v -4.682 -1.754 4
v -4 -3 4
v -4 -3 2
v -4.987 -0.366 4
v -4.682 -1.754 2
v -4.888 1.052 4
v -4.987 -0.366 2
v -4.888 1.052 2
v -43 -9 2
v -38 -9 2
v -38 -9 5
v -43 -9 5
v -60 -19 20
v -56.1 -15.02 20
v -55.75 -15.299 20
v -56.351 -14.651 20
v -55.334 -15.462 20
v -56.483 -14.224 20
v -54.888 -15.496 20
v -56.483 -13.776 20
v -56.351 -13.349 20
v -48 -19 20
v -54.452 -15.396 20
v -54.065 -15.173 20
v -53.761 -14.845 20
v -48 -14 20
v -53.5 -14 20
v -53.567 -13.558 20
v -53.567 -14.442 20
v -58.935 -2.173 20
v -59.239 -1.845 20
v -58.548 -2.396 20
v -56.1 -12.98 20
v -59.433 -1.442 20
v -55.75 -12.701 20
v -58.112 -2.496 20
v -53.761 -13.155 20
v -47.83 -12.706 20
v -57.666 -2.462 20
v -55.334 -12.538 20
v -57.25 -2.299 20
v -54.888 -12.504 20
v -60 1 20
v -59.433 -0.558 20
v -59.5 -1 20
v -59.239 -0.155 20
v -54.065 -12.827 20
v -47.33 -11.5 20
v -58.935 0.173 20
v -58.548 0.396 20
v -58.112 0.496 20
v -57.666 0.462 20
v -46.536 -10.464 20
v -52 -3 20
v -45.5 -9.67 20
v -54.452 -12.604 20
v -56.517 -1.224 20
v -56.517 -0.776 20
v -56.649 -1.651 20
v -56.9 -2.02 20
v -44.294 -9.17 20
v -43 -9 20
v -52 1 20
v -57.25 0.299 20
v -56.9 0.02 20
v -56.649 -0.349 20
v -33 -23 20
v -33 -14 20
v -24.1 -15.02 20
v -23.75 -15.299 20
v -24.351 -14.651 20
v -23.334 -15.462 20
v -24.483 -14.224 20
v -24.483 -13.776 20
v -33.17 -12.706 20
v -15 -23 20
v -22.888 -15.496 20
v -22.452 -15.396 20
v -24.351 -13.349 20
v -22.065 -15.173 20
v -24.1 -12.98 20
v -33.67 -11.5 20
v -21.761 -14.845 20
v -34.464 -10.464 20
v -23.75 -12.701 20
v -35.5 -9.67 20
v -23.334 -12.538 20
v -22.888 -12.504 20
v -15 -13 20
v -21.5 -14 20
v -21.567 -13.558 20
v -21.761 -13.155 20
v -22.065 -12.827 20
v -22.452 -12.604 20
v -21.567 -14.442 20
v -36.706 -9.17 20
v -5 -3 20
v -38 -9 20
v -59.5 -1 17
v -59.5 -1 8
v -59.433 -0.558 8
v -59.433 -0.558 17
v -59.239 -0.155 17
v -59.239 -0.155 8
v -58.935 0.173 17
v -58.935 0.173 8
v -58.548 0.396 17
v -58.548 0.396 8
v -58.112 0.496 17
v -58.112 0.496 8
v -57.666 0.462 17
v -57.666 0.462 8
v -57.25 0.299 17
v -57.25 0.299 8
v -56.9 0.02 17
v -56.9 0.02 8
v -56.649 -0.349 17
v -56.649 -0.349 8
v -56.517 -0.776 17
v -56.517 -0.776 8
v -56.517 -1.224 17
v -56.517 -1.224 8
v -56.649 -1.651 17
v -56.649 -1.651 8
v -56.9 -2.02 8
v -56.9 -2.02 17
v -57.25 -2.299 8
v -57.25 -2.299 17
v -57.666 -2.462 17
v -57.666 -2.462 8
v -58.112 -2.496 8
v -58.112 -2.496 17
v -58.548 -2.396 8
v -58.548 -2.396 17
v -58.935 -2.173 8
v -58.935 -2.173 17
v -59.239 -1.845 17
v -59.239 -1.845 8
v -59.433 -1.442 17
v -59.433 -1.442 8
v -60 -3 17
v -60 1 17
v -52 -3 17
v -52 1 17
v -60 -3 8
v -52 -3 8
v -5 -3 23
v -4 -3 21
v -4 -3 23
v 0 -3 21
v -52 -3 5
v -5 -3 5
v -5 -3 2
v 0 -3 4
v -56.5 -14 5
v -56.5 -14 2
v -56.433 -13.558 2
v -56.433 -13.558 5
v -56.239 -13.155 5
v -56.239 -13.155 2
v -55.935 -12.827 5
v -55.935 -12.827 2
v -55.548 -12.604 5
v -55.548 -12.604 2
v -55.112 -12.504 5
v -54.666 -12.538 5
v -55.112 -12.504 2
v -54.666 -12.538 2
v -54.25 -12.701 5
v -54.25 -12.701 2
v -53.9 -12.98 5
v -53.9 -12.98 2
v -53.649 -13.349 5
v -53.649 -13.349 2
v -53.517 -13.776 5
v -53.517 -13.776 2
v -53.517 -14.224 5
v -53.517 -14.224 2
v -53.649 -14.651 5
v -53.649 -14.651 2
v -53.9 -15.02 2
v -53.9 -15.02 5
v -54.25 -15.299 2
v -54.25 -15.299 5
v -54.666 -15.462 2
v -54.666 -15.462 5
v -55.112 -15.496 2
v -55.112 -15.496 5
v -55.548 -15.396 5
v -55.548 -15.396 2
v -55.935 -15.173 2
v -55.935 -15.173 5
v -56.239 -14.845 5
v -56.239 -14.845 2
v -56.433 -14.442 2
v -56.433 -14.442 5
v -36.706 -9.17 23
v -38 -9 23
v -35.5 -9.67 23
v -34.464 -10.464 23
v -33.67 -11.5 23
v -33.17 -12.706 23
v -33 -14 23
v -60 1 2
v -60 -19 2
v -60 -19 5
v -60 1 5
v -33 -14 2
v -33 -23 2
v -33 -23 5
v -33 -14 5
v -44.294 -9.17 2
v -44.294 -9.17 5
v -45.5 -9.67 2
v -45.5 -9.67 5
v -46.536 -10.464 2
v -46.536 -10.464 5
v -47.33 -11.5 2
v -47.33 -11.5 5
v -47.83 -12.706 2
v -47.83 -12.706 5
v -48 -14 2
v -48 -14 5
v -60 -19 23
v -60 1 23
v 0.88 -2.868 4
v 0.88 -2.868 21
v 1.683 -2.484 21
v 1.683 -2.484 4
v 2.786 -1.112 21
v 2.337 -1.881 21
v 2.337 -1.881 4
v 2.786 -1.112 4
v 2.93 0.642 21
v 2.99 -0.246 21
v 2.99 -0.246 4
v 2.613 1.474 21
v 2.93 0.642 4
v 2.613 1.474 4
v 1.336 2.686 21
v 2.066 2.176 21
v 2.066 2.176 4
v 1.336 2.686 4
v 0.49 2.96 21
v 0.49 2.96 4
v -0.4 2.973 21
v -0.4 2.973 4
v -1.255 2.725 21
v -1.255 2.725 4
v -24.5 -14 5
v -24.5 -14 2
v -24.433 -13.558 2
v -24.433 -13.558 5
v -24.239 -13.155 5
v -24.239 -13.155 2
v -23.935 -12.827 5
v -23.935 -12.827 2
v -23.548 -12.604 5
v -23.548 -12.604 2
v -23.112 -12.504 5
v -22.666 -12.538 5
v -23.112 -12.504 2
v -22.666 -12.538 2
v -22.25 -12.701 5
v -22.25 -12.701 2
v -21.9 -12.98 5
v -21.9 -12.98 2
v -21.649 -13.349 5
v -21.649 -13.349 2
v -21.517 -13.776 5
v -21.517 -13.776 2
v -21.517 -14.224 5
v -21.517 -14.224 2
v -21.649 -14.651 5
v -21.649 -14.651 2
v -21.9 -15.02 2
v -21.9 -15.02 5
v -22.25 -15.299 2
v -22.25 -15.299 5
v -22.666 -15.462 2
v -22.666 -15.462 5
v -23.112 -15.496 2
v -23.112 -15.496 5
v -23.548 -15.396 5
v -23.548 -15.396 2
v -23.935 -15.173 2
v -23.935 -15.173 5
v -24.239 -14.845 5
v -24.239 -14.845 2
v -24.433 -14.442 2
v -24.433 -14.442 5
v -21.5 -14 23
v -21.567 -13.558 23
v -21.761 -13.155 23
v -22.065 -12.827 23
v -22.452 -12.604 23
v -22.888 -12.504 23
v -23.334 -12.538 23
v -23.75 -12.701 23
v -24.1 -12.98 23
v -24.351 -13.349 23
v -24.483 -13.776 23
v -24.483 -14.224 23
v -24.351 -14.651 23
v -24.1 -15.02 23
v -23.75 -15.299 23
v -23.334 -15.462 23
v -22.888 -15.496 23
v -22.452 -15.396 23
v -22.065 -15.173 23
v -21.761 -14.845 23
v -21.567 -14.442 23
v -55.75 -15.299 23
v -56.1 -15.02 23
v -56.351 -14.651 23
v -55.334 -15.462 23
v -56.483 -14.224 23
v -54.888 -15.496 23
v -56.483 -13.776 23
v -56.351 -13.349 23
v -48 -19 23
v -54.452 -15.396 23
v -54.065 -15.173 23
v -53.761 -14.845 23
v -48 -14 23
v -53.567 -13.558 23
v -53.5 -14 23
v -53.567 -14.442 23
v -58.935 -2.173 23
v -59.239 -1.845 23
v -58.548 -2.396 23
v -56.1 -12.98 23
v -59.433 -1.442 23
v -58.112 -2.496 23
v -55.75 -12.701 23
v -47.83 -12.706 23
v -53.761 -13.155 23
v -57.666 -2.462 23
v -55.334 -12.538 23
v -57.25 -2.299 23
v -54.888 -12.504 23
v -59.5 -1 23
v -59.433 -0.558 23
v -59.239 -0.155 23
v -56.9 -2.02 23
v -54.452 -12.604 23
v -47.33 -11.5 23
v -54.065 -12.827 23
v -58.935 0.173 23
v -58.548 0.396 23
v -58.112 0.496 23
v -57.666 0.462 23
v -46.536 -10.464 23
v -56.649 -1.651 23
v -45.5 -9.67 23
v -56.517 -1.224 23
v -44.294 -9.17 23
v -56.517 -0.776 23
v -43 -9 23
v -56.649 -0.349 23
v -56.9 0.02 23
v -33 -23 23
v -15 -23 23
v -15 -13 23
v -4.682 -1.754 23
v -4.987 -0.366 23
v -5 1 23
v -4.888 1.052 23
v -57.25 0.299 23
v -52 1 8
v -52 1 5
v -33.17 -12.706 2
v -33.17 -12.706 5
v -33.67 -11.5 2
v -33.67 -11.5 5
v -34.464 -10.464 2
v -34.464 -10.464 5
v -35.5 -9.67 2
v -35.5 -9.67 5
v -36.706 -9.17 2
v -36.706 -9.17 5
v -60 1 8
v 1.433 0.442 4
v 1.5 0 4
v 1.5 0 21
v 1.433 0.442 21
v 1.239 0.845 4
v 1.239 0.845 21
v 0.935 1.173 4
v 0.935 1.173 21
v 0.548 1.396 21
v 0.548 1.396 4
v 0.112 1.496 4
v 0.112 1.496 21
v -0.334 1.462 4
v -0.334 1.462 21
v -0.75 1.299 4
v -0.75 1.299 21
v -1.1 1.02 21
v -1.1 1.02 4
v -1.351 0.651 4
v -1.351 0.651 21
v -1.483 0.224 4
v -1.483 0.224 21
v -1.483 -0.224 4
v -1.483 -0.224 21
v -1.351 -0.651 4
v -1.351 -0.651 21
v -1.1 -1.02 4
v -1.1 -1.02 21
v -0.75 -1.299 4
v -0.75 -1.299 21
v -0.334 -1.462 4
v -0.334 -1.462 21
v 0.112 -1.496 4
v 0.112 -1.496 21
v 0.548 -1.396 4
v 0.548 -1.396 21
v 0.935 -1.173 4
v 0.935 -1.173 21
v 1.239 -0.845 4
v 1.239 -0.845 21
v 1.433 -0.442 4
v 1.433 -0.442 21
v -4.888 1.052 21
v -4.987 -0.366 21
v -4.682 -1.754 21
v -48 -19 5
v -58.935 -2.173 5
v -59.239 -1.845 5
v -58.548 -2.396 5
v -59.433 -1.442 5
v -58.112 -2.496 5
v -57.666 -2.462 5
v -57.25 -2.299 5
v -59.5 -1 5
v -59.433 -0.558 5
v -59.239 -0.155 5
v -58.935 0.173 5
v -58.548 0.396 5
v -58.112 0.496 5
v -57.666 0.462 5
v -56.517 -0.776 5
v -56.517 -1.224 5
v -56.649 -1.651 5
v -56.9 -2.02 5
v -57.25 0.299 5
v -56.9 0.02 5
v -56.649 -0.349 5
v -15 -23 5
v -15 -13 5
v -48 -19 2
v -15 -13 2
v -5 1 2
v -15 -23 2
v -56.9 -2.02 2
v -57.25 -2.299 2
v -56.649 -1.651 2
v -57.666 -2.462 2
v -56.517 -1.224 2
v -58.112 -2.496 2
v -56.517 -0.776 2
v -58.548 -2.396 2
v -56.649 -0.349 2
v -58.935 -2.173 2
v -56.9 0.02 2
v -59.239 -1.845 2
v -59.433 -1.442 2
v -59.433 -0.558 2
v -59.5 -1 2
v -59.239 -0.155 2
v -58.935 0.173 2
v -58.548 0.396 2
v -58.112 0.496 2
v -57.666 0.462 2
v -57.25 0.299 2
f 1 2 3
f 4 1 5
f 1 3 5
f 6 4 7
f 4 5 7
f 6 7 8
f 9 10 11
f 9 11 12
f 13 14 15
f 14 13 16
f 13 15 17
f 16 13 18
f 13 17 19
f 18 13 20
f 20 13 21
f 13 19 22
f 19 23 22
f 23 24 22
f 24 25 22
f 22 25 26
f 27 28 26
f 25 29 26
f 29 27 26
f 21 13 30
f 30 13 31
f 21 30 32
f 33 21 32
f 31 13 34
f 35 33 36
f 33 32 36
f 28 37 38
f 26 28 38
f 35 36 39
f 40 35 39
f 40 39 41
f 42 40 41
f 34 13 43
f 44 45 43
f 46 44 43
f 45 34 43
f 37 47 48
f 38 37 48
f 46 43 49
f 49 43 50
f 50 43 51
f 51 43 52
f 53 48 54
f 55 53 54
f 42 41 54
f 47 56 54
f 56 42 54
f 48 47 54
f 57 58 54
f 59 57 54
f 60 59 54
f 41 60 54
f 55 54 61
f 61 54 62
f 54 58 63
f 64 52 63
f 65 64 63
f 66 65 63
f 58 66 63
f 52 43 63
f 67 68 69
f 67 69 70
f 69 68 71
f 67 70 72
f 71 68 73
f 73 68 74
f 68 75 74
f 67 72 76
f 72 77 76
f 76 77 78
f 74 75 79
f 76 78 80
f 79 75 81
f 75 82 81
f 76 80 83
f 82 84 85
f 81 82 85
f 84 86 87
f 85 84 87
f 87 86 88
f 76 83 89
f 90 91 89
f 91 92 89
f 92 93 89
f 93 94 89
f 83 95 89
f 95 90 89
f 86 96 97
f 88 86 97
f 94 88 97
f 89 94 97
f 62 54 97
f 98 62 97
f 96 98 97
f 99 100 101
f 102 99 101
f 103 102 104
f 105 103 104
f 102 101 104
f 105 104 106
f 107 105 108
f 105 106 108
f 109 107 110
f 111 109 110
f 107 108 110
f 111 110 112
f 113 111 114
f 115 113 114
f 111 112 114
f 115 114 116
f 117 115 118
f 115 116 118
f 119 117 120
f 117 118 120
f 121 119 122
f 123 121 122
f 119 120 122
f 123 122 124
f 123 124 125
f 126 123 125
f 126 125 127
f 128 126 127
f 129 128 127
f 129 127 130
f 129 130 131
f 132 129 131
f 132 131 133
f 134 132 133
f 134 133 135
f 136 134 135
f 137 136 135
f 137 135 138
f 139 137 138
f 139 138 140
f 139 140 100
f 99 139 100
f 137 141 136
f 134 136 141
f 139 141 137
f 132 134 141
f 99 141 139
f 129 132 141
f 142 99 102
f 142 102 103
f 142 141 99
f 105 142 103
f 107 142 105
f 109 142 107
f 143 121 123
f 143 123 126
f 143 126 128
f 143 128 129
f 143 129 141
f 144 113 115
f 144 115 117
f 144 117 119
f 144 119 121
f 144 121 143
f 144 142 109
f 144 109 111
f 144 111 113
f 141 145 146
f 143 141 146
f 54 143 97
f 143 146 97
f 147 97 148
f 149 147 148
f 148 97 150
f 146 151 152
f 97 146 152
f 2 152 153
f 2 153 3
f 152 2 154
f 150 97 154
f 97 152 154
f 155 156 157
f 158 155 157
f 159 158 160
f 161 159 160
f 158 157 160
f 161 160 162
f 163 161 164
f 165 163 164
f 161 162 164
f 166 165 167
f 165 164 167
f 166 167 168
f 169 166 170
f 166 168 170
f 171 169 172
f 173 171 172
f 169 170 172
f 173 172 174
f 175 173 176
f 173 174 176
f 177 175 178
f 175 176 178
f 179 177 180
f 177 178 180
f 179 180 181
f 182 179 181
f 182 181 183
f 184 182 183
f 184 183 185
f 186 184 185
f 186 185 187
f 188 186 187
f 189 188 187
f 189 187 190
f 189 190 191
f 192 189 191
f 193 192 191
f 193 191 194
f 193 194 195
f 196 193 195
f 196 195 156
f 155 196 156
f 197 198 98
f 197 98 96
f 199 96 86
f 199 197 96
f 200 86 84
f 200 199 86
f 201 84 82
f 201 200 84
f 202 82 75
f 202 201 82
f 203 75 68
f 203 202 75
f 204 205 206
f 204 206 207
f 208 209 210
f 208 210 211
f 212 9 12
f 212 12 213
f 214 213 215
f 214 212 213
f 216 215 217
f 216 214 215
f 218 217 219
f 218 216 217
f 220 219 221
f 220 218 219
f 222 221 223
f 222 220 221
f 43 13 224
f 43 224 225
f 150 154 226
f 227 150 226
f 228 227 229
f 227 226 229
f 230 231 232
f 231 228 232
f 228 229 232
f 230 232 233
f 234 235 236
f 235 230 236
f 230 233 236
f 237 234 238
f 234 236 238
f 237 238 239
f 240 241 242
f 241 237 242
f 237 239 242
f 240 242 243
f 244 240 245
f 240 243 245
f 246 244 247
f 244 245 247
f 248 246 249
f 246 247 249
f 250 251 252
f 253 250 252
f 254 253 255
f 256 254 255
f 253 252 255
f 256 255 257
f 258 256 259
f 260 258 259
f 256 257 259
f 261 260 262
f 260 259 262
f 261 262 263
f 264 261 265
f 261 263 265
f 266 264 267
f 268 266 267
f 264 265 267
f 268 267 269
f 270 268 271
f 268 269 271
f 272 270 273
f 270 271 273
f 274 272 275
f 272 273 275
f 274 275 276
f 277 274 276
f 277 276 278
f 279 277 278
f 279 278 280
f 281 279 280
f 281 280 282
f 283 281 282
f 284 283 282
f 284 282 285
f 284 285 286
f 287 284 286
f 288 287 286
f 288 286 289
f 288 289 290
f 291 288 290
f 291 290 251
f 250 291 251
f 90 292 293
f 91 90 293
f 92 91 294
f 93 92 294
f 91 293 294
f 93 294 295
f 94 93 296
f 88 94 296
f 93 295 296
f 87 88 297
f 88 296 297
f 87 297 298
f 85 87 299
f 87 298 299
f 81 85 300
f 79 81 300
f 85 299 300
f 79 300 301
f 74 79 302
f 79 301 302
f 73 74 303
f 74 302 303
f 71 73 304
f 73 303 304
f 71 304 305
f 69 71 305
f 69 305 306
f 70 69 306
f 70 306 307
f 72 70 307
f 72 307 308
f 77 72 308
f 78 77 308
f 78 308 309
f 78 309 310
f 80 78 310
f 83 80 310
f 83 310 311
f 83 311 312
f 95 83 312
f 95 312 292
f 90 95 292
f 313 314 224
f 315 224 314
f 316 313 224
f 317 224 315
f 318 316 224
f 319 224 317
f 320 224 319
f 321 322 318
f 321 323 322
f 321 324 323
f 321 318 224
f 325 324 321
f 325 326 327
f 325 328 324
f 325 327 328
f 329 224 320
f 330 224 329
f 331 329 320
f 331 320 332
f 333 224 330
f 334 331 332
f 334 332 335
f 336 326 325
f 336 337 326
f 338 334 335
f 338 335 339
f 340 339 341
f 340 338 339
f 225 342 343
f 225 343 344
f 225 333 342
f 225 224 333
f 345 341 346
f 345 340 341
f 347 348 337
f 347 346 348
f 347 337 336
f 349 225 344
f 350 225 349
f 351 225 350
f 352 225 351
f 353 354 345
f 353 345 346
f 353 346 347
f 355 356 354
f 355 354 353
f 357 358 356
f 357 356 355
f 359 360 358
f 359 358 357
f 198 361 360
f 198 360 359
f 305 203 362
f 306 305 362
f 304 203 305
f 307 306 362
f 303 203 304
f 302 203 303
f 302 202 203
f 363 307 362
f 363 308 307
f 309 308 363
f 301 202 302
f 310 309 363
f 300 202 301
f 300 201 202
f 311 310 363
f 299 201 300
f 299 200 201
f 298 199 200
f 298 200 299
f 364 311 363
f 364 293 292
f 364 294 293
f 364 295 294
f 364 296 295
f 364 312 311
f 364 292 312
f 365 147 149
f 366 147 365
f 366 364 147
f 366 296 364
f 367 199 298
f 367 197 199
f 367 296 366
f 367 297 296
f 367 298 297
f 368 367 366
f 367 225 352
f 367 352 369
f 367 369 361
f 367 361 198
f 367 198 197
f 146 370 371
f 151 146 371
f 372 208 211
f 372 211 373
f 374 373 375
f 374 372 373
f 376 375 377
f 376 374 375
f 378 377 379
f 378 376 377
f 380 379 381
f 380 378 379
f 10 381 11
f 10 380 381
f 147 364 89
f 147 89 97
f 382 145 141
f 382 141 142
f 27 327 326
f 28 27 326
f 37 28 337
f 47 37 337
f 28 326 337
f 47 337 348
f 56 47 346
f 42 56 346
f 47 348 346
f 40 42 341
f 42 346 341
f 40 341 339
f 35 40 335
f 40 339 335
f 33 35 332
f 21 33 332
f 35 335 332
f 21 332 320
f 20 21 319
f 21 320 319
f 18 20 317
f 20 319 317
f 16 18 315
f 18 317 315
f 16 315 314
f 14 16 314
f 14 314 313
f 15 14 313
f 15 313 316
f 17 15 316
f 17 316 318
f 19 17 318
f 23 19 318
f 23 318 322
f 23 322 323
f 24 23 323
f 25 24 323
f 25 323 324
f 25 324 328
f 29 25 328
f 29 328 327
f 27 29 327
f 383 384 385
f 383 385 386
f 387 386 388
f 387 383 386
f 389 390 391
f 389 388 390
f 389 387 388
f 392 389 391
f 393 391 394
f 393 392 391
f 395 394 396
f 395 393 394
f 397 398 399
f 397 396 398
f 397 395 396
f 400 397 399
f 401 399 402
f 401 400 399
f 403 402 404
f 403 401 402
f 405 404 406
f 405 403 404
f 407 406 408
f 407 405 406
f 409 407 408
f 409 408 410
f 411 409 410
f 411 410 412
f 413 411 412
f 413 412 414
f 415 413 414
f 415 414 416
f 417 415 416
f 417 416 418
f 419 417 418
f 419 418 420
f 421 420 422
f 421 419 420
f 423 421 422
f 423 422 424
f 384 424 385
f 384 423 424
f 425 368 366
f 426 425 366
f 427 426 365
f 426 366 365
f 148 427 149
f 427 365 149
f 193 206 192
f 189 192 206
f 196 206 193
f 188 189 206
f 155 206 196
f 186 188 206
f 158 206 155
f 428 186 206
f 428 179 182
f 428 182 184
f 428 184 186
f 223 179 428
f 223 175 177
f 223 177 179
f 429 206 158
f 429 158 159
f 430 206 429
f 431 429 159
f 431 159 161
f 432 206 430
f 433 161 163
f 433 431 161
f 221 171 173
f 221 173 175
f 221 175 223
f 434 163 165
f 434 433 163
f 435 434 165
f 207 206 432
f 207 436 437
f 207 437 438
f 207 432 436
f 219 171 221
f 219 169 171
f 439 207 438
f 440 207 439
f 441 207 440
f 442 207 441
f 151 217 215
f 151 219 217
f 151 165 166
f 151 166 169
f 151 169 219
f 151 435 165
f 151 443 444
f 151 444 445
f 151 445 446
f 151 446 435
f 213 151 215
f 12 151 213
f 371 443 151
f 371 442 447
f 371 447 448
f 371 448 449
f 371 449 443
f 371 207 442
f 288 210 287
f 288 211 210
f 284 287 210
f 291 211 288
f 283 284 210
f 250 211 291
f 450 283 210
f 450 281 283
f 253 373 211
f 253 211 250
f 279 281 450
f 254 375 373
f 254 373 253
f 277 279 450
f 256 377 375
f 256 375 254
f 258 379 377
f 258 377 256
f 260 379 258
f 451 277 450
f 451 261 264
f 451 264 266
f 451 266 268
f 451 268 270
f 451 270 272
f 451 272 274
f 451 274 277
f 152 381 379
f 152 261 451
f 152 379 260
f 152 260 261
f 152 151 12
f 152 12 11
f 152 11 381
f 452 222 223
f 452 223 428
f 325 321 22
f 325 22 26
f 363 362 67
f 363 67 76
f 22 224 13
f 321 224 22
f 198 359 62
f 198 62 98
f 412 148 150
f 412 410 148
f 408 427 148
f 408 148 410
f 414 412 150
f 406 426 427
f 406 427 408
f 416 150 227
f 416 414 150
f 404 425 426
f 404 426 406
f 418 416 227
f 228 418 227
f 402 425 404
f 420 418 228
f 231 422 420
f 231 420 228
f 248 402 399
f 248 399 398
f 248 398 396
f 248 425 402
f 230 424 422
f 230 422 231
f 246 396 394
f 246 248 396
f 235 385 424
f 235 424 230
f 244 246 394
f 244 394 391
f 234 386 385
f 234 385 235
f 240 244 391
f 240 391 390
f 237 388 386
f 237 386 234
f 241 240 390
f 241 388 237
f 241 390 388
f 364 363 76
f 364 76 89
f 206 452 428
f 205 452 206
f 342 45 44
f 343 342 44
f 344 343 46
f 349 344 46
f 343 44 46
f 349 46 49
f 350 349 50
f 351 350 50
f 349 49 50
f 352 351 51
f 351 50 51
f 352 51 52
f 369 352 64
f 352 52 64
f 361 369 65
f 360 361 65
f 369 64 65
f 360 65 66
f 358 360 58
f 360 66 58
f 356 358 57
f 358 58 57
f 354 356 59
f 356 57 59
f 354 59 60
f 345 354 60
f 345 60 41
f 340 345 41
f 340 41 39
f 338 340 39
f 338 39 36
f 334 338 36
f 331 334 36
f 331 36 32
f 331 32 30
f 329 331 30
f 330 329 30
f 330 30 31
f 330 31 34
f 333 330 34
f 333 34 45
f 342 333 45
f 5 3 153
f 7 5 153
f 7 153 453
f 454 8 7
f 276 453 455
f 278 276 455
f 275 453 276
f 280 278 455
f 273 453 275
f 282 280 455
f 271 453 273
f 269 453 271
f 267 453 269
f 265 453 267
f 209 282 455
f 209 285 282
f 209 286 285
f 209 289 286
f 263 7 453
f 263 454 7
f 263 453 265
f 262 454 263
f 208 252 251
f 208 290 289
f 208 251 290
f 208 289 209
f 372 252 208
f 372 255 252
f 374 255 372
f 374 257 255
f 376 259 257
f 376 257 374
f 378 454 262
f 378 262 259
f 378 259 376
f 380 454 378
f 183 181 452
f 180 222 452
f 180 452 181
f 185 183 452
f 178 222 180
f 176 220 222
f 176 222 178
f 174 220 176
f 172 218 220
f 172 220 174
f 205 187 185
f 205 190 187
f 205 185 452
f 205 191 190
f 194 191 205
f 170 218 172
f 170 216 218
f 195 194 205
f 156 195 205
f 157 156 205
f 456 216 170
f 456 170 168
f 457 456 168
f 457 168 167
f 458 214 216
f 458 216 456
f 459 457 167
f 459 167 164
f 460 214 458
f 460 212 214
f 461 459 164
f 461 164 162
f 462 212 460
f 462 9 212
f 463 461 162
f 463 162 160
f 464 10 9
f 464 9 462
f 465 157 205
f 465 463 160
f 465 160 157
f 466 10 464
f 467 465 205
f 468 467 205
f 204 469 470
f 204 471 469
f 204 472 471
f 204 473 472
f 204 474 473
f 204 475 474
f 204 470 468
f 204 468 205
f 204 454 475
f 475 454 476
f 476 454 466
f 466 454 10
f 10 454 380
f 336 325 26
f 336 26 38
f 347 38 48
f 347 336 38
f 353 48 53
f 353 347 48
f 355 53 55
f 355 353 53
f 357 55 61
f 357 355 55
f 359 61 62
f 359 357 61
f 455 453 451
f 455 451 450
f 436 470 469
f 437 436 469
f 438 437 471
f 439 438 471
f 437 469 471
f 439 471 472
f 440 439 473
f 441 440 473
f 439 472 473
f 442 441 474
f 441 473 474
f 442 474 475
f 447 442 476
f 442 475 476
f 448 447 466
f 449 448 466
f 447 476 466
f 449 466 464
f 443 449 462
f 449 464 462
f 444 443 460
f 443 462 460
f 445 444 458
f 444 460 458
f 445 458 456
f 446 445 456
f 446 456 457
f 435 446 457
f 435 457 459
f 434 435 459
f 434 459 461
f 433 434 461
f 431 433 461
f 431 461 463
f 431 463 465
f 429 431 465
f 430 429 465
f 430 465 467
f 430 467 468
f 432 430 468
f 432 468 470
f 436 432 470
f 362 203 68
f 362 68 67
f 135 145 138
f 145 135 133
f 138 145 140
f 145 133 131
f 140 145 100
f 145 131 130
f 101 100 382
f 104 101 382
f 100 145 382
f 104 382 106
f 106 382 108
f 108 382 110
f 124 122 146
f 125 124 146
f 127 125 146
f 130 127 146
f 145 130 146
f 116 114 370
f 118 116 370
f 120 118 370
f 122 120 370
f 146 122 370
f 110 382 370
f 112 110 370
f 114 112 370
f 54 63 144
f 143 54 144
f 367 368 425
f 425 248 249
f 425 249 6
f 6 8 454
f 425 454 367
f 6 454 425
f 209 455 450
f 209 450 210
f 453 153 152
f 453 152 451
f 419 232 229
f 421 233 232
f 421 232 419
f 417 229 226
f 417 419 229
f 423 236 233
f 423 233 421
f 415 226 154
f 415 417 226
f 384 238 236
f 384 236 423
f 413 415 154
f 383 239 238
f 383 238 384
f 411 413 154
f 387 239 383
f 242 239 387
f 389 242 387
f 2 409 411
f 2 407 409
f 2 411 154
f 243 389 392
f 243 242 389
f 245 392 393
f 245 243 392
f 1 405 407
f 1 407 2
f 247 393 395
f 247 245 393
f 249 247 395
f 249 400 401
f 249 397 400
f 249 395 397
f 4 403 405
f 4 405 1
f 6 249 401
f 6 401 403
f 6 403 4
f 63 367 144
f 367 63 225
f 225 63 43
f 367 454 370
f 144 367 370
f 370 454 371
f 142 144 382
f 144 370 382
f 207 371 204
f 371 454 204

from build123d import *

# Parameters (mm, degrees)
SKETCH_1_R          = 3
SKETCH_1_R_2        = 1.5
EXTRUDE_1_DEPTH     = 25
EXTRUDE_2_DEPTH     = 5
SKETCH_3_R          = 1.5
CUT_EXTRUDE_1_DEPTH = 26
SKETCH_4_R          = 5
CUT_EXTRUDE_2_DEPTH = 4
SKETCH_5_R          = 1.5
EXTRUDE_3_DEPTH     = 5
SKETCH_6_R          = 5
CUT_EXTRUDE_3_DEPTH = 4
SKETCH_7_W          = 8
SKETCH_7_H          = 3
CUT_EXTRUDE_4_DEPTH = 25
SKETCH_8_R          = 1.5
CUT_EXTRUDE_5_DEPTH = 26
SKETCH_9_W          = 62.045271576
SKETCH_9_H          = 47.186533399
CUT_EXTRUDE_6_DEPTH = 2
SKETCH_10_R         = 43.321303534
CUT_EXTRUDE_7_DEPTH = 2


with BuildPart() as part:
    # 草图1 → 凸台-拉伸1 (new body)
    with BuildSketch(Plane.XY):
        with BuildLine():
            Line((-60, -3), (0, -3))
            ThreePointArc((0, -3), (-2.93041003, -0.642415018), (-1.255026274, 2.72486863))
            Line((-1.255026274, 2.72486863), (-5, 1))
            Line((-5, 1), (-60, 1))
            Line((-60, 1), (-60, -3))
        make_face()
        Circle(SKETCH_1_R)
        Circle(SKETCH_1_R_2, mode=Mode.SUBTRACT)
    extrude(amount=EXTRUDE_1_DEPTH)

    # 草图2 → 凸台-拉伸2 (add)
    with BuildSketch(Plane.XY.offset(25)):
        with BuildLine():
            Line((-60, -3), (-60, -19))
            Line((-60, -19), (-48, -19))
            Line((-48, -19), (-48, -14))
            ThreePointArc((-48, -14), (-46.535533906, -10.464466094), (-43, -9))
            Line((-43, -9), (-38, -9))
            ThreePointArc((-38, -9), (-34.464466094, -10.464466094), (-33, -14))
            Line((-33, -14), (-33, -23))
            Line((-33, -23), (-15, -23))
            Line((-15, -23), (-15, -13))
            Line((-15, -13), (-5, -3))
            Line((-5, -3), (-60, -3))
        make_face()
    extrude(amount=-EXTRUDE_2_DEPTH)

    # 草图3 → 切除-拉伸1 (cut, through all)
    with BuildSketch(Plane.XY.offset(25)):
        with Locations((-55, -14)):
            Circle(SKETCH_3_R)
        with Locations((-23, -14)):
            Circle(SKETCH_3_R)
    extrude(amount=-CUT_EXTRUDE_1_DEPTH, mode=Mode.SUBTRACT)

    # 草图4 → 切除-拉伸2 (cut)
    with BuildSketch(Plane.XY.offset(25)):
        Circle(SKETCH_4_R)
    extrude(amount=-CUT_EXTRUDE_2_DEPTH, mode=Mode.SUBTRACT)

    # 草图5 → 凸台-拉伸3 (add)
    with BuildSketch(Plane(origin=(0, 0, 0), x_dir=(-1, 0, 0), z_dir=(0, 0, -1))):
        with BuildLine():
            Line((60, -3), (5, -3))
            Line((5, -3), (15, -13))
            Line((15, -13), (15, -23))
            Line((15, -23), (33, -23))
            Line((33, -23), (33, -14))
            ThreePointArc((33, -14), (34.464466094, -10.464466094), (38, -9))
            Line((38, -9), (43, -9))
            ThreePointArc((43, -9), (46.535533906, -10.464466094), (48, -14))
            Line((48, -14), (48, -19))
            Line((48, -19), (60, -19))
            Line((60, -19), (60, -3))
        make_face()
        with Locations((23, -14)):
            Circle(SKETCH_5_R, mode=Mode.SUBTRACT)
        with Locations((55, -14)):
            Circle(SKETCH_5_R, mode=Mode.SUBTRACT)
    extrude(amount=-EXTRUDE_3_DEPTH)

    # 草图6 → 切除-拉伸3 (cut)
    with BuildSketch(Plane(origin=(0, 0, 0), x_dir=(-1, 0, 0), z_dir=(0, 0, -1))):
        Circle(SKETCH_6_R)
    extrude(amount=-CUT_EXTRUDE_3_DEPTH, mode=Mode.SUBTRACT)

    # 草图7 → 切除-拉伸4 (cut, through all)
    with BuildSketch(Plane(origin=(0, 1, 0), x_dir=(1, 0, 0), z_dir=(0, 1, 0))):
        with Locations((-56, -6.5)):
            Rectangle(SKETCH_7_W, SKETCH_7_H)
        with Locations((-56, -18.5)):
            Rectangle(SKETCH_7_W, SKETCH_7_H)
    extrude(amount=-CUT_EXTRUDE_4_DEPTH, mode=Mode.SUBTRACT)

    # 草图8 → 切除-拉伸5 (cut, through all)
    with BuildSketch(Plane(origin=(0, 0, 0), x_dir=(-1, 0, 0), z_dir=(0, 0, -1))):
        with Locations((58, -1)):
            Circle(SKETCH_8_R)
    extrude(amount=-CUT_EXTRUDE_5_DEPTH, mode=Mode.SUBTRACT)

    # 草图9 → 切除-拉伸6 (cut)
    with BuildSketch(Plane(origin=(0, 0, 0), x_dir=(-1, 0, 0), z_dir=(0, 0, -1))):
        with Locations((33.21865334, -9.347420282)):
            Rectangle(SKETCH_9_W, SKETCH_9_H)
    extrude(amount=-CUT_EXTRUDE_6_DEPTH, mode=Mode.SUBTRACT)

    # 草图10 → 切除-拉伸7 (cut)
    with BuildSketch(Plane.XY.offset(25)):
        with Locations((-29.013307515, -5.864856676)):
            Circle(SKETCH_10_R)
    extrude(amount=-CUT_EXTRUDE_7_DEPTH, mode=Mode.SUBTRACT)


solid = part.part
